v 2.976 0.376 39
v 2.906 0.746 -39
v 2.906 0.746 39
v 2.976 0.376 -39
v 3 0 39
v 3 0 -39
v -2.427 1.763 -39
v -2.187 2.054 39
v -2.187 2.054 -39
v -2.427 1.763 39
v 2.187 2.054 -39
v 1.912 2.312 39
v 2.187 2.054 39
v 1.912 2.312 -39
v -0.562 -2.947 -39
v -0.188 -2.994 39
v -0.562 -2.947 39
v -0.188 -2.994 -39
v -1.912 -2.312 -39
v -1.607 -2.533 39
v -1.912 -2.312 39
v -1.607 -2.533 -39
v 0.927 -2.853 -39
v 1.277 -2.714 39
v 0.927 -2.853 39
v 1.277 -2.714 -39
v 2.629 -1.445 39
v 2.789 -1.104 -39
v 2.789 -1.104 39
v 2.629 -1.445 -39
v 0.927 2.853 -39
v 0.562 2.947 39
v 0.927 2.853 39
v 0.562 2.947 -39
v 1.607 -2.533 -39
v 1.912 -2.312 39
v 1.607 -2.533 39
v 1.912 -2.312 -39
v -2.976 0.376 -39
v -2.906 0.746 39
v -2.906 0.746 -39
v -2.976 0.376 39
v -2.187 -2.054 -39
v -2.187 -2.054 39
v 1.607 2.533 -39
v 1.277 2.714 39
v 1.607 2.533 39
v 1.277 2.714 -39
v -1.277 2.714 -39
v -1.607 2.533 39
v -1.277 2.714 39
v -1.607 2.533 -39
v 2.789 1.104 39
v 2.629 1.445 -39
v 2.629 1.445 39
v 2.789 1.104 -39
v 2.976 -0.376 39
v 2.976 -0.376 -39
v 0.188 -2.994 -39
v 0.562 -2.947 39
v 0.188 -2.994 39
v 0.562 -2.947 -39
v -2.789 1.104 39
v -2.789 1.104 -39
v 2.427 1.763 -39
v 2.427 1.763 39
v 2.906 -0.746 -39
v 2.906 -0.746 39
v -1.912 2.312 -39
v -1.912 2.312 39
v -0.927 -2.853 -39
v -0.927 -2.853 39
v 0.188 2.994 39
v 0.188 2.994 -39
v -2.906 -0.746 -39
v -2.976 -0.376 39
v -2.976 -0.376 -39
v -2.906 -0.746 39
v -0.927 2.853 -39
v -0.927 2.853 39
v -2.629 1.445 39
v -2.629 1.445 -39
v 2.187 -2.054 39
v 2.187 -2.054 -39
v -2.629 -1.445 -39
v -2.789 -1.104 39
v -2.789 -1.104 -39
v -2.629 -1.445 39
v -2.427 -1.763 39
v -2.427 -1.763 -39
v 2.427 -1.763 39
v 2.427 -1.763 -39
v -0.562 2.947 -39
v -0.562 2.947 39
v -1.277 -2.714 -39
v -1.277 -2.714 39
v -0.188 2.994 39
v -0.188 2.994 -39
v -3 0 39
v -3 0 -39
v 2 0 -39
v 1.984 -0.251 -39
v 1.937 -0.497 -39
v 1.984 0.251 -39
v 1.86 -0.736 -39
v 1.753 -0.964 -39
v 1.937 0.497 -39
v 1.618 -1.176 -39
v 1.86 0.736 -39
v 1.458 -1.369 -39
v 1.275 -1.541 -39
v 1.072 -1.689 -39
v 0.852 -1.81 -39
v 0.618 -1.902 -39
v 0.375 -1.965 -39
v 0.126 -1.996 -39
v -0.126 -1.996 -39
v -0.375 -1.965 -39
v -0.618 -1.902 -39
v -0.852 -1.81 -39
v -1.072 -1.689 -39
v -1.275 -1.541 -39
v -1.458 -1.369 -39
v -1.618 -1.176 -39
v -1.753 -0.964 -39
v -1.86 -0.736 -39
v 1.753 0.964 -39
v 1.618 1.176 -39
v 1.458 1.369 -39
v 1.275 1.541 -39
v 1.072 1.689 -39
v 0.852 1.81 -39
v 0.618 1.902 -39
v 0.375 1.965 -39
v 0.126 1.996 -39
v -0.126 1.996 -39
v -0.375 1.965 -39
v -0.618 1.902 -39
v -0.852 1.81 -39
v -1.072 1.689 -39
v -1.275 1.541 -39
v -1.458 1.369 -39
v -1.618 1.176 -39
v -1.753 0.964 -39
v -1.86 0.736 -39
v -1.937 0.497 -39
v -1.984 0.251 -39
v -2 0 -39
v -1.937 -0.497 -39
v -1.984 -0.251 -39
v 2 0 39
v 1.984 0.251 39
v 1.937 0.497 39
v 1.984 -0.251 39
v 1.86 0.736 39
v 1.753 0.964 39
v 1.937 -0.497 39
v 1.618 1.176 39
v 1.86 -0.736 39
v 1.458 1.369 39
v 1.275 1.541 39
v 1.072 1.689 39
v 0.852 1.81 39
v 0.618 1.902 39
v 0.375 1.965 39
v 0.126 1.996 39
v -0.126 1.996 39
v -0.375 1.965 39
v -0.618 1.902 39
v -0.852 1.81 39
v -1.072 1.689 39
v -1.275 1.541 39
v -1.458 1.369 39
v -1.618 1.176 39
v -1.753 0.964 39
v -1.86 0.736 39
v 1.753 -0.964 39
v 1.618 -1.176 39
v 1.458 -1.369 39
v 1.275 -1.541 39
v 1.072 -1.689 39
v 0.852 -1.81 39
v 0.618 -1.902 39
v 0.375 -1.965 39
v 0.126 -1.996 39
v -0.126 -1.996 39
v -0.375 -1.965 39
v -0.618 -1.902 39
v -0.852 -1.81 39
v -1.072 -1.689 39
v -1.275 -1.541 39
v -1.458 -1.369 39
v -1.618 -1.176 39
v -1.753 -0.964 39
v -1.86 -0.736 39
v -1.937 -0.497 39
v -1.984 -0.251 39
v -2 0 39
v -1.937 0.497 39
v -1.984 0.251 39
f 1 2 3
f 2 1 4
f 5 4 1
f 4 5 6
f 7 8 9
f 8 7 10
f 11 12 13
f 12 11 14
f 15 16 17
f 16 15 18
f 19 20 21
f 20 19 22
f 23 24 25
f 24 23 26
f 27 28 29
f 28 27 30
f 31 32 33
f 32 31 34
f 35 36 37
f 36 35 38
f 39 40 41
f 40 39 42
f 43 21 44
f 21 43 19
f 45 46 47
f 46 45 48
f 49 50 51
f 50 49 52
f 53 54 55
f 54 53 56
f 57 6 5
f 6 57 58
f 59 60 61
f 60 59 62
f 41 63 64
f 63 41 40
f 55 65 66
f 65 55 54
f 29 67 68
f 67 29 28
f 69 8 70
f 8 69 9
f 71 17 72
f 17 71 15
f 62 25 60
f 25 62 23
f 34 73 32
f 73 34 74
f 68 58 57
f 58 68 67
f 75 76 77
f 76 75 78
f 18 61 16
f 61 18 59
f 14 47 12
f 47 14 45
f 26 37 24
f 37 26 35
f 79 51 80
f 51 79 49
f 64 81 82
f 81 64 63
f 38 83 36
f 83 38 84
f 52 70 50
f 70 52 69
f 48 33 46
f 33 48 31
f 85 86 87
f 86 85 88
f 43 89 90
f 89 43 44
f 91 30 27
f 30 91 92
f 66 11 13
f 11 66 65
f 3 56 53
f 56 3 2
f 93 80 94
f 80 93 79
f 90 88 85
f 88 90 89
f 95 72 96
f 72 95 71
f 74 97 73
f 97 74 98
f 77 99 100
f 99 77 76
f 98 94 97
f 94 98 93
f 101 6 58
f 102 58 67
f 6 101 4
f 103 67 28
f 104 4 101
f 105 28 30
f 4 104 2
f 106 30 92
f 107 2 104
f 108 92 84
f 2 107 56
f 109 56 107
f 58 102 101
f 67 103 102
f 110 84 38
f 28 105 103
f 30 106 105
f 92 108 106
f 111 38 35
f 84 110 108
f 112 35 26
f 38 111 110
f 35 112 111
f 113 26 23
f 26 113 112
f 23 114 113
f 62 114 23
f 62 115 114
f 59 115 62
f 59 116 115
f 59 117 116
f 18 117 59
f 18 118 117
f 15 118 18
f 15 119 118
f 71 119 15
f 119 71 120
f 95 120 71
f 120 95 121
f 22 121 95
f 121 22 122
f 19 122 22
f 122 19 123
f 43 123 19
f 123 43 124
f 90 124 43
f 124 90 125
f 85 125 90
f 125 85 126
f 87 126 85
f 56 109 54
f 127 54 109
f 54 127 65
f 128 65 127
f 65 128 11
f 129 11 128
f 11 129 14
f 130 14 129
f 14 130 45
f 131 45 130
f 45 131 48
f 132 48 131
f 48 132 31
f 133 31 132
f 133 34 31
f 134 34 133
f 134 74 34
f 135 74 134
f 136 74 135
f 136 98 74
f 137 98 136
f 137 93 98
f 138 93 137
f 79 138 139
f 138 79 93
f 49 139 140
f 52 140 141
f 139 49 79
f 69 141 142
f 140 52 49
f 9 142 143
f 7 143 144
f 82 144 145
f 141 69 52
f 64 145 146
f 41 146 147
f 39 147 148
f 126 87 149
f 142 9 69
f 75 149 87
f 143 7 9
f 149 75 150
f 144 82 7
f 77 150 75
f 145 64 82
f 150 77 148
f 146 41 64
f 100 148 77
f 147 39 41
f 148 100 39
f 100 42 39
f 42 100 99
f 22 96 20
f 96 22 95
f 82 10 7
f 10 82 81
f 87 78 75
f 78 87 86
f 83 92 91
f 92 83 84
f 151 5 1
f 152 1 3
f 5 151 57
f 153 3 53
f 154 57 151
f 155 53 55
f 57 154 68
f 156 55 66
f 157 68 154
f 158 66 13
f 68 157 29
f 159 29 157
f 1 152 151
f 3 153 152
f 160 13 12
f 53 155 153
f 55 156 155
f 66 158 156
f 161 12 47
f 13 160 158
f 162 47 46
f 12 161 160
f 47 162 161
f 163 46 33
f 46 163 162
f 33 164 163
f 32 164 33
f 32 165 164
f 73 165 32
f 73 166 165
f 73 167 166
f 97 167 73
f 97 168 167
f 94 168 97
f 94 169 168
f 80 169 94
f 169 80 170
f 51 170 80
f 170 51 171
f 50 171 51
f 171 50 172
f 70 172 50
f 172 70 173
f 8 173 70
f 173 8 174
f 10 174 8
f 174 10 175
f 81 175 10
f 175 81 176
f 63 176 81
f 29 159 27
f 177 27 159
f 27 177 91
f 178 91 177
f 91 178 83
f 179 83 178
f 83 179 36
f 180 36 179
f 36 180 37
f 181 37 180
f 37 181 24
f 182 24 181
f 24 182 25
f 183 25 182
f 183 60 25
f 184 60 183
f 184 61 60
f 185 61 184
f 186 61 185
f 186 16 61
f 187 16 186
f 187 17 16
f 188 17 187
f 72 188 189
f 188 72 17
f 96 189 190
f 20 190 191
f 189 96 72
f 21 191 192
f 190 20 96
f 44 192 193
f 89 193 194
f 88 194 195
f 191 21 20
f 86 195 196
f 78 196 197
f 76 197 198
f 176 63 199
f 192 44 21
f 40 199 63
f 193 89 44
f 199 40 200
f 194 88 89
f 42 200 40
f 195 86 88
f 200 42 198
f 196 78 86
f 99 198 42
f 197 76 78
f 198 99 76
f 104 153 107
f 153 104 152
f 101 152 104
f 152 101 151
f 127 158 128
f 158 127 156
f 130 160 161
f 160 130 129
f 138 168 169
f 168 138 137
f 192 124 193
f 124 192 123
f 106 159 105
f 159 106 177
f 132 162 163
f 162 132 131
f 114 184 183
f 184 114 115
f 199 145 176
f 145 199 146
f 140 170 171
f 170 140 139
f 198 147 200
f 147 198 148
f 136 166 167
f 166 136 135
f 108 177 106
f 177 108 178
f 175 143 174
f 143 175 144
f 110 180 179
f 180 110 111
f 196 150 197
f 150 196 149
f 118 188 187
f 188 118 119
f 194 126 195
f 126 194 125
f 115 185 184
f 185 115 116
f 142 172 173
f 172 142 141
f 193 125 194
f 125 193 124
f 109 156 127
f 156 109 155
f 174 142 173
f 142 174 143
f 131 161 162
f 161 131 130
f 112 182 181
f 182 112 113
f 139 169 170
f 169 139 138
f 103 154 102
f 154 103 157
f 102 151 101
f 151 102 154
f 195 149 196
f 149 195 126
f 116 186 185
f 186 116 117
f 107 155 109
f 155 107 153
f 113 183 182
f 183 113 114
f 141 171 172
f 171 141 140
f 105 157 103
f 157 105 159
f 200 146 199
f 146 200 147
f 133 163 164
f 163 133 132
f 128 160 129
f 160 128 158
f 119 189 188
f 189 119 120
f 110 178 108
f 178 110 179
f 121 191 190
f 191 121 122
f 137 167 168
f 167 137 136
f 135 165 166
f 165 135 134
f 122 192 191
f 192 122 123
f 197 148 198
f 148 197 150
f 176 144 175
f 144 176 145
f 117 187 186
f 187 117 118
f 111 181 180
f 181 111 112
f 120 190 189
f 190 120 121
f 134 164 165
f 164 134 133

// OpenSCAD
$fn = 50;


difference() {
	union() {
		translate(v = [0, 0, -39.0000000000]) {
			cylinder(h = 78, r = 3.0000000000);
		}
	}
	union() {
		translate(v = [0, 0, -100.0000000000]) {
			cylinder(h = 200, r = 2.0000000000);
		}
	}
}
